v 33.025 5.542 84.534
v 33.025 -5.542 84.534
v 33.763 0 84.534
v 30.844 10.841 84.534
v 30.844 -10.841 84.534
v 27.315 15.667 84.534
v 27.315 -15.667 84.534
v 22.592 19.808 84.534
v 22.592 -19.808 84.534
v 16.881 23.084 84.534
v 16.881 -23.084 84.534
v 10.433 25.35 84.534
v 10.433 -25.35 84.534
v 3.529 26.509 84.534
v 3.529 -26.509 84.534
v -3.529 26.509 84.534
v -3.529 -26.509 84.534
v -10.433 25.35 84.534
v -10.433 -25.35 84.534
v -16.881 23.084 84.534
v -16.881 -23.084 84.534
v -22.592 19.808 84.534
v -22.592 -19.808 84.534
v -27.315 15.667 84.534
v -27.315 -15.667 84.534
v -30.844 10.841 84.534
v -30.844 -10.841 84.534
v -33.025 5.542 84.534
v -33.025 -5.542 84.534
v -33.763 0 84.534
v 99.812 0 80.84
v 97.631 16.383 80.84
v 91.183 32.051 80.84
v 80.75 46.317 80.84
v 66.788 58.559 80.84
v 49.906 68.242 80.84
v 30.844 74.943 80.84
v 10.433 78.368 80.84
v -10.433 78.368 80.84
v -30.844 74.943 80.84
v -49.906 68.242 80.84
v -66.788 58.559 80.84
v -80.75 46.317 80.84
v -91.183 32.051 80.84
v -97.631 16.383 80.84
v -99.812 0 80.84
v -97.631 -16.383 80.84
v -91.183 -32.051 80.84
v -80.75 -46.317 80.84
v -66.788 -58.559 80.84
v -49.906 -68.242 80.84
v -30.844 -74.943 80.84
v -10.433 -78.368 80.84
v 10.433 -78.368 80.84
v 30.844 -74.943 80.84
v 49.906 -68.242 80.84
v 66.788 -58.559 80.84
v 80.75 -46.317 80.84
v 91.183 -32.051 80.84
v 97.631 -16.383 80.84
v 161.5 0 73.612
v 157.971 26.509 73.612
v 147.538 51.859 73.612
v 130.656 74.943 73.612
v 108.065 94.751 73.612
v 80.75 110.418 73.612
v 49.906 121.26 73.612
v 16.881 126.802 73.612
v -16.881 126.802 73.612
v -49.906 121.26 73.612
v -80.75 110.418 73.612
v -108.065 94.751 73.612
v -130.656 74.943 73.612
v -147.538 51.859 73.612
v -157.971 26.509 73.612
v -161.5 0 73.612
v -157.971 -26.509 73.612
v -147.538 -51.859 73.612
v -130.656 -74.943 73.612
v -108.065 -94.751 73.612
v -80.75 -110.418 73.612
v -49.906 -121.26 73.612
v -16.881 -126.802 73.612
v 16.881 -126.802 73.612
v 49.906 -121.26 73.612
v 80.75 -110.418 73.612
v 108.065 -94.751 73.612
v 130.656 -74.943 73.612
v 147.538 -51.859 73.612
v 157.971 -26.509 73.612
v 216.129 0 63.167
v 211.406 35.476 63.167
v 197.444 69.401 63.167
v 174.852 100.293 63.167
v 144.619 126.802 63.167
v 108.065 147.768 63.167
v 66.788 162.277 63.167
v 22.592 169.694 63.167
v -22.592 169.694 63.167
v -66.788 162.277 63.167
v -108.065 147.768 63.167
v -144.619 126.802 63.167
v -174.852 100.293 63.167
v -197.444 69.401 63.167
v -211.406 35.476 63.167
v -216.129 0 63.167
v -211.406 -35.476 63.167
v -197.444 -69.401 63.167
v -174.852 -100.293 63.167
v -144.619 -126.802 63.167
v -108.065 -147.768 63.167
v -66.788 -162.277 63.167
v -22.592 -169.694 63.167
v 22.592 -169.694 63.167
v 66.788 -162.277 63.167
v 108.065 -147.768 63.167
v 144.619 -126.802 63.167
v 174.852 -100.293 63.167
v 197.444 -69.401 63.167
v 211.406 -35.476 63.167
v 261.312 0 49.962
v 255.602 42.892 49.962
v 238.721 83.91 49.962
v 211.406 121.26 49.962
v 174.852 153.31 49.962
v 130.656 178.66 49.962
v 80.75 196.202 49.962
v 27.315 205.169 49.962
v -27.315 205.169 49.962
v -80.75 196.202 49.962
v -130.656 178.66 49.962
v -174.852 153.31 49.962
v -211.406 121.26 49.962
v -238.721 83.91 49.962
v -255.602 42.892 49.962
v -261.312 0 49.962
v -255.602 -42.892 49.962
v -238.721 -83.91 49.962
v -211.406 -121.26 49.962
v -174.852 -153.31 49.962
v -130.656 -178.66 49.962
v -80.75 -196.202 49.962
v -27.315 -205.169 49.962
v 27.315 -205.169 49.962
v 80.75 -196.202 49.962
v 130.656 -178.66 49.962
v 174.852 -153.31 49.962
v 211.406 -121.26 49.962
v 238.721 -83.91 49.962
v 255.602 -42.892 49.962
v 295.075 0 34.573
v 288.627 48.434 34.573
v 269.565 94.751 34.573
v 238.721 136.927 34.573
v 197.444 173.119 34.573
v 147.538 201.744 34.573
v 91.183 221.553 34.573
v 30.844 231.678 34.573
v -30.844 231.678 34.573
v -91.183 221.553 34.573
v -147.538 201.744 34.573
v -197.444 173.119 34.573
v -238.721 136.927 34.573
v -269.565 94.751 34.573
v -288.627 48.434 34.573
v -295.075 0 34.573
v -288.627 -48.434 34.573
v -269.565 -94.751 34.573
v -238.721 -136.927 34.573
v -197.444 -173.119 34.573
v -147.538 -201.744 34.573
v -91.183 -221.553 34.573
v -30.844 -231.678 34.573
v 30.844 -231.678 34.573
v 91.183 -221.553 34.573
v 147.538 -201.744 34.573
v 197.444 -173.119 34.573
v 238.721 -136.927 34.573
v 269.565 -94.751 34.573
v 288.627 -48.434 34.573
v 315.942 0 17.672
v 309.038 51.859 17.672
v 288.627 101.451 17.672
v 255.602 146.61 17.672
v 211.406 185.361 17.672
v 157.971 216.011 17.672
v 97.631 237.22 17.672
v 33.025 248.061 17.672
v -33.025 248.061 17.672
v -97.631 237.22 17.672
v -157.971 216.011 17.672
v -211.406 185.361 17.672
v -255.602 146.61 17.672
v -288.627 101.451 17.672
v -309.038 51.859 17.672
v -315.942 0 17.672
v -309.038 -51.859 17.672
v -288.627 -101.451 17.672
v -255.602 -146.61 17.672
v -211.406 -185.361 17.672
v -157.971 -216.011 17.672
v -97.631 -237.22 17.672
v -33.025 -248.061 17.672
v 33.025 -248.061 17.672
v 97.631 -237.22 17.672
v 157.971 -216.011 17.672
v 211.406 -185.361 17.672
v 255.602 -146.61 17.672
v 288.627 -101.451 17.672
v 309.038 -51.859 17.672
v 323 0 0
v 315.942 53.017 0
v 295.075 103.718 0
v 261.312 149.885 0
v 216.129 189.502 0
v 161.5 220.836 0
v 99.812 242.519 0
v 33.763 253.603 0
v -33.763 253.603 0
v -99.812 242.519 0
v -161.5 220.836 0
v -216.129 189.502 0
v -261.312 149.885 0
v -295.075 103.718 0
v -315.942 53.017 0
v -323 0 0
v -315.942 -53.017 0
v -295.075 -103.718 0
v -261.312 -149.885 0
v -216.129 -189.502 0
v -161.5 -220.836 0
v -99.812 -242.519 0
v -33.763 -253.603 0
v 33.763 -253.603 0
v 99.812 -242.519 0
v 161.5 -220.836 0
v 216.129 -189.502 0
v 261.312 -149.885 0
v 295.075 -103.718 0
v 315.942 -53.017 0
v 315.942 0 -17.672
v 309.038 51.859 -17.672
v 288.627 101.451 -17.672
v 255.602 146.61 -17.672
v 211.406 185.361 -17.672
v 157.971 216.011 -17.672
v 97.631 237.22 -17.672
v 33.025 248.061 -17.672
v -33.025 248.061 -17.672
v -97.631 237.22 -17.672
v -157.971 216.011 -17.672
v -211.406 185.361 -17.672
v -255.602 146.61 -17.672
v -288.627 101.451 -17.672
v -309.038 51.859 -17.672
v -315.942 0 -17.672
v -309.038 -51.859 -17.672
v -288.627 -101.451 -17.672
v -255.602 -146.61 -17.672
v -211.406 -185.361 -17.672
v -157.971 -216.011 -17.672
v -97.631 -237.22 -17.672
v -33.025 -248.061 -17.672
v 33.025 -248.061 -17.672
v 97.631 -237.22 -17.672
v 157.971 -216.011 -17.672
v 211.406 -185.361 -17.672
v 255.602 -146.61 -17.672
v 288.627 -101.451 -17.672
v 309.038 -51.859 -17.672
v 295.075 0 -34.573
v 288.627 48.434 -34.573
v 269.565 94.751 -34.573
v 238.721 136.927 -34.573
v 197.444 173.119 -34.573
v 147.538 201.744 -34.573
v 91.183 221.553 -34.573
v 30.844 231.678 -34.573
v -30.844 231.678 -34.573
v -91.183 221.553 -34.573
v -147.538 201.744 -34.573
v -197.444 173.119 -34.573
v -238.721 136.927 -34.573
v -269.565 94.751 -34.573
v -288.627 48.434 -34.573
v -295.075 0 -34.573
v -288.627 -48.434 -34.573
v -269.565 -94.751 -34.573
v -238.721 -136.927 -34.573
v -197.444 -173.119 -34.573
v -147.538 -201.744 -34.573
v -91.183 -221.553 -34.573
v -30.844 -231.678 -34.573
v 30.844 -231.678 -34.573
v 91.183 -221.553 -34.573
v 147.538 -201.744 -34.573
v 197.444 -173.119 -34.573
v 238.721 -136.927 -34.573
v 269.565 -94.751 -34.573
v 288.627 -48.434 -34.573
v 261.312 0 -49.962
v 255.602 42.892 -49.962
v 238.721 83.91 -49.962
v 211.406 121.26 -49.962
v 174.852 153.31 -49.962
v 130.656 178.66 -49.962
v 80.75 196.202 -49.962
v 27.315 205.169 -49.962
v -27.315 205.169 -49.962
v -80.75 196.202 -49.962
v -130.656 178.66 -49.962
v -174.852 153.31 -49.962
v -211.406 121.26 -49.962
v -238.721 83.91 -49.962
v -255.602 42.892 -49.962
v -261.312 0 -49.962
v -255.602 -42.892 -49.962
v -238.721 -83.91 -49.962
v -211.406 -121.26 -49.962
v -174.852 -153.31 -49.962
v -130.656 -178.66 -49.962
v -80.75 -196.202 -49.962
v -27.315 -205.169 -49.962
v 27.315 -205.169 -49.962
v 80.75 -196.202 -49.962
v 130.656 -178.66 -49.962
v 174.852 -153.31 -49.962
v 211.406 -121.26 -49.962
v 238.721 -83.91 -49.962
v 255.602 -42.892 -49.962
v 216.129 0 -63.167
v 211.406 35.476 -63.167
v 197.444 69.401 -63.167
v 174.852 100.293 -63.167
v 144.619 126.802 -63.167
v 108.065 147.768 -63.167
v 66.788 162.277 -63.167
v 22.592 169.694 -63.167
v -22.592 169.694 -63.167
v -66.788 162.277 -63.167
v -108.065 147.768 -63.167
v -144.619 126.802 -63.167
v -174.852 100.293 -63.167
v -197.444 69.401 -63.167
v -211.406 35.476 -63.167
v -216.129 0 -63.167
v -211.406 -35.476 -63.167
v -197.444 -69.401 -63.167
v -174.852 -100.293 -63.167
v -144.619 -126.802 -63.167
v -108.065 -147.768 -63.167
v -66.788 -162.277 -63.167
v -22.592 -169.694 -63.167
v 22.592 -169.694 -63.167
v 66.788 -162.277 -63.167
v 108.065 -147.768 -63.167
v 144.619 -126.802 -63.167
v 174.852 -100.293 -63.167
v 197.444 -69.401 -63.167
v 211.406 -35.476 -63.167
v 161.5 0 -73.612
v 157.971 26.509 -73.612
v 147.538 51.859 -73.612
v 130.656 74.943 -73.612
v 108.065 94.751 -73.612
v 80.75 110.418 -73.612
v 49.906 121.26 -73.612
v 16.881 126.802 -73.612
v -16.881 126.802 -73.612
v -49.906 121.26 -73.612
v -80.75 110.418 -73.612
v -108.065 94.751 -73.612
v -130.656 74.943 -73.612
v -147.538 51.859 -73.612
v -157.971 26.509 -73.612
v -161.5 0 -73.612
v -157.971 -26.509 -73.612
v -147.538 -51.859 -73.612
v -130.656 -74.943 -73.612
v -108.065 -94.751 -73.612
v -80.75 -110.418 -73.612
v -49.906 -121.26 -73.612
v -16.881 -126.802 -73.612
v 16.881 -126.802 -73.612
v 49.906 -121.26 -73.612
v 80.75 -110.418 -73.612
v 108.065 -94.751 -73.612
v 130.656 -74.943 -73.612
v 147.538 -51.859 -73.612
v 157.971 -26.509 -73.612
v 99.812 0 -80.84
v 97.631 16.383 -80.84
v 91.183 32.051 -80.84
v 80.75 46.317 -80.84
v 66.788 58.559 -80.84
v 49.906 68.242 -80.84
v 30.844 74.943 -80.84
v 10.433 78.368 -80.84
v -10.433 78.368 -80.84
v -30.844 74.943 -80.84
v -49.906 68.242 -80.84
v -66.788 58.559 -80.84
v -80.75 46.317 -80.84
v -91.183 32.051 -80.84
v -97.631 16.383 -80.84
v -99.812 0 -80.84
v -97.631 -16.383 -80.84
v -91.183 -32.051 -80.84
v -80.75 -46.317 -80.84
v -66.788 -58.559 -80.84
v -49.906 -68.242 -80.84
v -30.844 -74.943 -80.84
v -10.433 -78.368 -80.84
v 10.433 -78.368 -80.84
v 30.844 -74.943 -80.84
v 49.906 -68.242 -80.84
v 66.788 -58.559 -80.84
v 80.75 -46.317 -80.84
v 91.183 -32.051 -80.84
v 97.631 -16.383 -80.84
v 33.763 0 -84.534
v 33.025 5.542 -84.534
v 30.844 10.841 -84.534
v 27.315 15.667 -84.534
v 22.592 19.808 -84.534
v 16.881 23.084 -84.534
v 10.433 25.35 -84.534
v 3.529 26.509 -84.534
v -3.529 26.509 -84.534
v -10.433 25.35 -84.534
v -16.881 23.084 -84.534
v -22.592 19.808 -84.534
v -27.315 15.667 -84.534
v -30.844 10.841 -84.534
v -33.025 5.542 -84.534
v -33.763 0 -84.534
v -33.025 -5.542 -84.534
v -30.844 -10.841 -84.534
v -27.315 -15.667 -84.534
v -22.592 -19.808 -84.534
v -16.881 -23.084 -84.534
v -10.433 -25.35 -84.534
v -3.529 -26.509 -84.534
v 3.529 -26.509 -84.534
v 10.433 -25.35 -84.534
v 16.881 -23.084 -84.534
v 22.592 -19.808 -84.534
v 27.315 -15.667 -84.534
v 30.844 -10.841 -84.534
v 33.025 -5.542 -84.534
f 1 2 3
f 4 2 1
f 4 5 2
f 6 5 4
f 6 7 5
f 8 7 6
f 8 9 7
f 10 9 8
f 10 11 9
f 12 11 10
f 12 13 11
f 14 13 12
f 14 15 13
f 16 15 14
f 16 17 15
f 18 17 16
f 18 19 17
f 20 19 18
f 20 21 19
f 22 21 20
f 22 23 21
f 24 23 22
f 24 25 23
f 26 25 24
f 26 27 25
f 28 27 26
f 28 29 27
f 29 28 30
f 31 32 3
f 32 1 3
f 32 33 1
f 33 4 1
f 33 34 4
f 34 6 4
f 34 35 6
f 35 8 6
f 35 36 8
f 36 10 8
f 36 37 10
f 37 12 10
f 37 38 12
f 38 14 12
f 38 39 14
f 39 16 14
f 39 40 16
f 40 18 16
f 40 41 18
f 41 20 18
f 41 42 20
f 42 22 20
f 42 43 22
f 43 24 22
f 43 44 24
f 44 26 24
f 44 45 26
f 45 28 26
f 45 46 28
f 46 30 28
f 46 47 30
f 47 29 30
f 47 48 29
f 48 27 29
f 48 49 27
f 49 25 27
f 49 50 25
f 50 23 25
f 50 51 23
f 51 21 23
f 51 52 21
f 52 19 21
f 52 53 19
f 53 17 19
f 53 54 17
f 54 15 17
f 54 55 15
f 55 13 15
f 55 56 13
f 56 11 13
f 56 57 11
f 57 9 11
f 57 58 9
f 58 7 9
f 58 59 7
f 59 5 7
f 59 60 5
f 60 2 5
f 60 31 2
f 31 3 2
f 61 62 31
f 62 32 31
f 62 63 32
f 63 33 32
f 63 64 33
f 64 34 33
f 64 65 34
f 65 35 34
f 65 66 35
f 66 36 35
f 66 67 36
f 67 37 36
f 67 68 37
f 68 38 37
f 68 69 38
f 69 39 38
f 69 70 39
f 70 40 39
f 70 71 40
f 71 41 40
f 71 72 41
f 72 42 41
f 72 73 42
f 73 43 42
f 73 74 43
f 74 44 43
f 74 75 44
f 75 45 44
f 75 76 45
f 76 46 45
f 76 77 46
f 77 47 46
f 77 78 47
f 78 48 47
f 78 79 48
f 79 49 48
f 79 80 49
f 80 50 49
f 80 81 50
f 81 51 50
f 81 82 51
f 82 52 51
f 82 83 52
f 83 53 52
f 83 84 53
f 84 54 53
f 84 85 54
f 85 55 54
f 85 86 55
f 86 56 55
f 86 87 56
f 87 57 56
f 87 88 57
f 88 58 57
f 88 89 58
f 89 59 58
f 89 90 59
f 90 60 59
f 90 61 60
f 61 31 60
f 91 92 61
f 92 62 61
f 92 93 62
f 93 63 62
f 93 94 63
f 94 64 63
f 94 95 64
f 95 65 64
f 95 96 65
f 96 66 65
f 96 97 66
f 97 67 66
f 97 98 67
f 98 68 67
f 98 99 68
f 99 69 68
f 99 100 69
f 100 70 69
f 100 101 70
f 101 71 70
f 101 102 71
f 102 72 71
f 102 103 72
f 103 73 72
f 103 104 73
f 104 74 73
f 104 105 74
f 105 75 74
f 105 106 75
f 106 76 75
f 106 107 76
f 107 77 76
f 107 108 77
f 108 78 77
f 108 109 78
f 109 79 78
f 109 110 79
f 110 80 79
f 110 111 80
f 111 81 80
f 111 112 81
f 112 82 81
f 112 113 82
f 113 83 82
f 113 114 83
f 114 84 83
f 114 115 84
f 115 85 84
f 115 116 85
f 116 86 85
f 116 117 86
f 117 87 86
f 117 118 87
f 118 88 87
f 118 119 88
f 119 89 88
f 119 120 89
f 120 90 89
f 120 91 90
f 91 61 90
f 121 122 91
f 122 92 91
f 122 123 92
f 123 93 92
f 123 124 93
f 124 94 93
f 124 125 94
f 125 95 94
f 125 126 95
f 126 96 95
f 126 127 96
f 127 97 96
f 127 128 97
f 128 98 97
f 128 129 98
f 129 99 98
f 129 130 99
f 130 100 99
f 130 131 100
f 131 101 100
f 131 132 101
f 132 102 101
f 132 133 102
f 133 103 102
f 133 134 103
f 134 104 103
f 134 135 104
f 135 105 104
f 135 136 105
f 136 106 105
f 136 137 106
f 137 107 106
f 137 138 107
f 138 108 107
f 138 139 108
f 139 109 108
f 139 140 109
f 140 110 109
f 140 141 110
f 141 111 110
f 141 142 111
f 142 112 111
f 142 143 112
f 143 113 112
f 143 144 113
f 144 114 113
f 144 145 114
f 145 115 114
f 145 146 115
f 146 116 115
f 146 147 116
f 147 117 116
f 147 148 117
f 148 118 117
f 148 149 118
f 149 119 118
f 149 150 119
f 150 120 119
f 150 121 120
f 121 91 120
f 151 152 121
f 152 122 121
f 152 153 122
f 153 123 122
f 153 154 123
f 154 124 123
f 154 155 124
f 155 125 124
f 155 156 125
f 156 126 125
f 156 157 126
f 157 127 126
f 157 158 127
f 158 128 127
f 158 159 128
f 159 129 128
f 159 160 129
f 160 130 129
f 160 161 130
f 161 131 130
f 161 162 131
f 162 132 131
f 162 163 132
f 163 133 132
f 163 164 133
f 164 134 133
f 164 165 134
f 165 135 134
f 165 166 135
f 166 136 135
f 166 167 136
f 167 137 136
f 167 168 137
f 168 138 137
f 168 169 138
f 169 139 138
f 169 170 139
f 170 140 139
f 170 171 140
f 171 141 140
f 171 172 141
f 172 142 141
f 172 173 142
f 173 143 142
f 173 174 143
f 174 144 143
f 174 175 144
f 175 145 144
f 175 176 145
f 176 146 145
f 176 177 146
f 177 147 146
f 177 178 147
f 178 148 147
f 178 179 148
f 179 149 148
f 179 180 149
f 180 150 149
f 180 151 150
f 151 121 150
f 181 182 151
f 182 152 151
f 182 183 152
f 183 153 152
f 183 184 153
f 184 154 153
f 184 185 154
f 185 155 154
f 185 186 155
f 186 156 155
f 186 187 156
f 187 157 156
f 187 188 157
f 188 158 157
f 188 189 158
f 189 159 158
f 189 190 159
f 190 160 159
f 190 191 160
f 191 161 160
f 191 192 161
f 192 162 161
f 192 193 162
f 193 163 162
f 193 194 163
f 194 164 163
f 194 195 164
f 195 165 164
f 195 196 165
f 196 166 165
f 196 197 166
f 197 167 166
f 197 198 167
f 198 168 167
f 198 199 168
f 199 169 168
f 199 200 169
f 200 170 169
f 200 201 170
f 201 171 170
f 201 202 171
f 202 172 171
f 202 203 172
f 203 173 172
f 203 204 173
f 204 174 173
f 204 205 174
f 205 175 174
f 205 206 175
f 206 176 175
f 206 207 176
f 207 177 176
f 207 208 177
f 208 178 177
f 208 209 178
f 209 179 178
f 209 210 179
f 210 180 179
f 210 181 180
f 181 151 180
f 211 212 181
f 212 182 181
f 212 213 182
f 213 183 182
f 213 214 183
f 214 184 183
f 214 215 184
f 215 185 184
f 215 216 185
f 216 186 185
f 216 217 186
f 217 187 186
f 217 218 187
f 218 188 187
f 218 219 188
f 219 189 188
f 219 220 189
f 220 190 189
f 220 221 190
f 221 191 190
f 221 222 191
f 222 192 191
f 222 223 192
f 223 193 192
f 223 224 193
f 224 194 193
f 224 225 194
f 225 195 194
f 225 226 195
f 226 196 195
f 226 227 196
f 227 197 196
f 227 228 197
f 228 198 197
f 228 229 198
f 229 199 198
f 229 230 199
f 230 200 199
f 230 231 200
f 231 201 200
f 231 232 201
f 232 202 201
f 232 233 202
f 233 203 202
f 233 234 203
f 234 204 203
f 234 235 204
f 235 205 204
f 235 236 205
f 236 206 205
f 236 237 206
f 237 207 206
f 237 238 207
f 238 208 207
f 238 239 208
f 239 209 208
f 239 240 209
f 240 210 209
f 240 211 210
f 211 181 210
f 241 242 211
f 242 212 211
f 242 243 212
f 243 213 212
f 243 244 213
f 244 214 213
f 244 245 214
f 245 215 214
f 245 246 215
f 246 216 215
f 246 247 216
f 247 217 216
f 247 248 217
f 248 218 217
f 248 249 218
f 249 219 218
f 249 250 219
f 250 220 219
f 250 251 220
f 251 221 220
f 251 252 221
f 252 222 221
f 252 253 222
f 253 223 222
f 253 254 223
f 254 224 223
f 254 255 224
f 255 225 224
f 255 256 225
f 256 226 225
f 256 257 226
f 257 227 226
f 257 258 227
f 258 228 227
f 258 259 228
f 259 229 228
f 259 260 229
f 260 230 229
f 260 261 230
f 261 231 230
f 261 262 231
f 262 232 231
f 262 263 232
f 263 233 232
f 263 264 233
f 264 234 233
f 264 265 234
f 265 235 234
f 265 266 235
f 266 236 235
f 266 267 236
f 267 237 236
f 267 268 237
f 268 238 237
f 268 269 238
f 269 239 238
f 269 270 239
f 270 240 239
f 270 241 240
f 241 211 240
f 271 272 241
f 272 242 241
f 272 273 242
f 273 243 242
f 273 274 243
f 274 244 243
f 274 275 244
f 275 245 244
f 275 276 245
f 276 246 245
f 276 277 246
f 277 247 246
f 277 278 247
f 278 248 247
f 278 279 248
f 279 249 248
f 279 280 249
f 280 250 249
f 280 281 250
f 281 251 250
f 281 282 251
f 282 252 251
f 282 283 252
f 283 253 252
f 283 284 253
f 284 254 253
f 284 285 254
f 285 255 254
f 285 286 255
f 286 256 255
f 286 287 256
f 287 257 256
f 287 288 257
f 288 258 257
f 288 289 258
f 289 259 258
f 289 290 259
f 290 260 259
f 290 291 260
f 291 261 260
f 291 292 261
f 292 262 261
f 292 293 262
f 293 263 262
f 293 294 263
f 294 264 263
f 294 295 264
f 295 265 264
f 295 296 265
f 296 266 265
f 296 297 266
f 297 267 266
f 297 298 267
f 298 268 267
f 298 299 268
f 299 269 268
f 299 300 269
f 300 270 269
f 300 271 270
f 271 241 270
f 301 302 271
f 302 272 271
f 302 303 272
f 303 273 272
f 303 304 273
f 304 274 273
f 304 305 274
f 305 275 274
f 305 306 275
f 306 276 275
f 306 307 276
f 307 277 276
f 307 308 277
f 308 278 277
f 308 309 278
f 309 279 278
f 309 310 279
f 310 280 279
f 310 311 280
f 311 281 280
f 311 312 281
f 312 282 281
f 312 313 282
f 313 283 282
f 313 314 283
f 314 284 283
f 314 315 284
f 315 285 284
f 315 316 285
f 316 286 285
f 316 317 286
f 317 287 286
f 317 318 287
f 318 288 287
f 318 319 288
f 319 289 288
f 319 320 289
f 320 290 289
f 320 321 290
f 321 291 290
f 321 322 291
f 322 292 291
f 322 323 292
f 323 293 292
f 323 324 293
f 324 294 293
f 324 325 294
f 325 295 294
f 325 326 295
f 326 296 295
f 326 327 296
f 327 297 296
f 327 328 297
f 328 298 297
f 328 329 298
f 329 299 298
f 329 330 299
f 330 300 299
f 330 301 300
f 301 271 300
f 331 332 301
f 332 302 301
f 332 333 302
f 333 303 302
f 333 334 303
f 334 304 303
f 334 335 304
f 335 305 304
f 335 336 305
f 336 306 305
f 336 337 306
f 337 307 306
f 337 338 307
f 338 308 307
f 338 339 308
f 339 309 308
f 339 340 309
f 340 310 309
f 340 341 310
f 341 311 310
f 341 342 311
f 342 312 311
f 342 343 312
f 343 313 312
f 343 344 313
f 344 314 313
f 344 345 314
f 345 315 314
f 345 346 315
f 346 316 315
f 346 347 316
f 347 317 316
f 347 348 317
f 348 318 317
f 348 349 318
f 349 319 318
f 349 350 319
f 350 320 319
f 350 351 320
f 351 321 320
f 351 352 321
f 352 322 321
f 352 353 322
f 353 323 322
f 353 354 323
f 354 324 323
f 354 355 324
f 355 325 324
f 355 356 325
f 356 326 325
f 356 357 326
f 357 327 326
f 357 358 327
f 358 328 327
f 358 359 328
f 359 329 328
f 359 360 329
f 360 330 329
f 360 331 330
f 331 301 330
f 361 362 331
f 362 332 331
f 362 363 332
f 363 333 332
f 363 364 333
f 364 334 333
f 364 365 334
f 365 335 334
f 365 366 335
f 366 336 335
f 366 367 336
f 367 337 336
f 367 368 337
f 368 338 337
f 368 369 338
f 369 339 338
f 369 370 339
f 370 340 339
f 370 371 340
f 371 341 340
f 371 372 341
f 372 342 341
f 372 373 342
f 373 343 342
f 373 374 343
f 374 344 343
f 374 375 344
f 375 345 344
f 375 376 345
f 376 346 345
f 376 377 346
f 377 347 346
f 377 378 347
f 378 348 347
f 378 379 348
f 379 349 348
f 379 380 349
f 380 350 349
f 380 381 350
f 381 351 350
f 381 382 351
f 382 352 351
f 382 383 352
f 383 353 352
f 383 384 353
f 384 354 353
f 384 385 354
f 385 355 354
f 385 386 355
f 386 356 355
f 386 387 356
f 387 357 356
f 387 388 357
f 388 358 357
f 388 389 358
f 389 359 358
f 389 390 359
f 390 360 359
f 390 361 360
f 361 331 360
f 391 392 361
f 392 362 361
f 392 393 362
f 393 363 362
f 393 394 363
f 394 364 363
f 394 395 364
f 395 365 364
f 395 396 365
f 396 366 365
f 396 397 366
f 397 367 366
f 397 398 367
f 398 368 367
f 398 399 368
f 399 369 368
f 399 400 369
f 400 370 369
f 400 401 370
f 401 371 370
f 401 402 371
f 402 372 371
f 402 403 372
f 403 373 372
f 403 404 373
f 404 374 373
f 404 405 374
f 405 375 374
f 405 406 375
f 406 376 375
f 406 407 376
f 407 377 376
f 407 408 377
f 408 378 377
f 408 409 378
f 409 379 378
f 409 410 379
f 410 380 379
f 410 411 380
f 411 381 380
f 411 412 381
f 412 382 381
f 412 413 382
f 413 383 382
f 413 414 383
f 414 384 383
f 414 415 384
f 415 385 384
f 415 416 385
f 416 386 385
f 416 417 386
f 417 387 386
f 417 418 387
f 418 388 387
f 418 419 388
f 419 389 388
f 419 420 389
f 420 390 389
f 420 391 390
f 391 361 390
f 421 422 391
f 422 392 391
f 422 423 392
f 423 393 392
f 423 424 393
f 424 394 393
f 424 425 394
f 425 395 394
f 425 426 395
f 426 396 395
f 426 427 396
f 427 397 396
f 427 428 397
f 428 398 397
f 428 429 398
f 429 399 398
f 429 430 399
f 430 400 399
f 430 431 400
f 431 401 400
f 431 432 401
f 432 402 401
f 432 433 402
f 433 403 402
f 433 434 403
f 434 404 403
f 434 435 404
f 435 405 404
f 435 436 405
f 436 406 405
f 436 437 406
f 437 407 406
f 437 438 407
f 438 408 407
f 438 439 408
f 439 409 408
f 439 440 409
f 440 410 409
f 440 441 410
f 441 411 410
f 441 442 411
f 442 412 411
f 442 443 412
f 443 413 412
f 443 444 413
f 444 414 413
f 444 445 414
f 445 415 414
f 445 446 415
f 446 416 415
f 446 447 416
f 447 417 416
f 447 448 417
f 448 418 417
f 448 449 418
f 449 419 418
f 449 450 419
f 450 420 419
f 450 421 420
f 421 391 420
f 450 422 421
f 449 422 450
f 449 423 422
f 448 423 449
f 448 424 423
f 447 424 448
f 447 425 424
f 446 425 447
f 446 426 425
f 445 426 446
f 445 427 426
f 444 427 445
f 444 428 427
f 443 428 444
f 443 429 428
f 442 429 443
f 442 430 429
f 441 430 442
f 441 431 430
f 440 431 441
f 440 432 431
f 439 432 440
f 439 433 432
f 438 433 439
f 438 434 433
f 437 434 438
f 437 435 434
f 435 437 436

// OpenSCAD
// Generated by SolidPython 1.0.1 on 2020-07-29 00:46:54


scale(v = [19, 15, 5]) {
	sphere(r = 17);
}
/***********************************************
*********      SolidPython code:      **********
************************************************
 
# import packages: SolidPython
from solid import *
from solid.utils import *
from itertools import chain, combinations, permutations


class Resize:

    def __init__(self, scad_file):
        self.scad_file = scad_file
        #self.scad_file = import_scad(scad_file)
        # cone/cylinder param:
        self.r1 = 0
        self.r2 = 0
        self.h = 0
        # rectangular prism param:
        self.w = 0
        self.l = 0
        # ellipse param:
        self.r = 0

    # import OpenScad code (file name corresponds to shape)


    # classify shape + parameters
    def assign(self, param1, param2, param3):
        if self.scad_file == 'cone.scad':
            self.r1 = param1
            self.r2 = param2
            self.h = param3
        elif self.scad_file == 'cylinder.scad':
            self.r1 = param1
            self.r2 = param2
            self.h = param3
        elif self.scad_file == 'rectangularPrism.scad':
            self.h = param1
            self.l = param2
            self.w = param3
        else:
            self.r = param1
            self.h = param2

    # resize parameters
    def iterate(self):
        x = range(3, 20, 2)
        i = 1
        if self.scad_file == 'cone.scad':
            tempList = list(permutations(x, 2))
            for temp in tempList:
                param1 = temp[0]
                param2 = temp[1]
                filepath = 'produced_scad_files/' + 'cone' + str(param1) + '_' + str(param2) + '_' + '.scad'
                scad_render_to_file(cylinder(h=param1, r1=param2, r2=0), filepath)

        elif self.scad_file == 'cylinder.scad':
            tempList = list(permutations(x, 3))
            for temp in tempList:
                param1 = temp[0]
                param2 = temp[1]
                filepath = 'produced_scad_files/' + 'cylinder' + str(param1) + '_' + str(param2) + '_' + '.scad'
                scad_render_to_file(cylinder(h=param1, r1=param2, r2=param2), filepath)

        elif self.scad_file == 'rectangularPrism.scad':
            tempList = list(permutations(x, 3))
            for temp in tempList:
                param1 = temp[0]
                param2 = temp[1]
                param3 = temp[2]
                filepath = 'produced_scad_files/' + 'rectangularPrism' + str(param1) + '_' + str(param2) + '_' + str(
                    param3) + '.scad'
                scad_render_to_file(cube(size=(param1, param2, param3)), filepath)

        elif self.scad_file == 'ellipse.scad':
            tempList = list(permutations(x, 4))
            for temp in tempList:
                param1 = temp[0]
                param2 = temp[1]
                param3 = temp[2]
                param4 = temp[3]
                filepath = 'produced_scad_files/' + 'ellipse' + str(param1) + '_' + str(param2) + '_' + str(param3) + '_' + str(param4) + '.scad'
                scad_render_to_file(scale([param1, param2, param3])(sphere(r=param4)), filepath)

    def render_to_scadfile(self):
        scad_render_to_file(scad, 'example.scad') 
 
************************************************/
